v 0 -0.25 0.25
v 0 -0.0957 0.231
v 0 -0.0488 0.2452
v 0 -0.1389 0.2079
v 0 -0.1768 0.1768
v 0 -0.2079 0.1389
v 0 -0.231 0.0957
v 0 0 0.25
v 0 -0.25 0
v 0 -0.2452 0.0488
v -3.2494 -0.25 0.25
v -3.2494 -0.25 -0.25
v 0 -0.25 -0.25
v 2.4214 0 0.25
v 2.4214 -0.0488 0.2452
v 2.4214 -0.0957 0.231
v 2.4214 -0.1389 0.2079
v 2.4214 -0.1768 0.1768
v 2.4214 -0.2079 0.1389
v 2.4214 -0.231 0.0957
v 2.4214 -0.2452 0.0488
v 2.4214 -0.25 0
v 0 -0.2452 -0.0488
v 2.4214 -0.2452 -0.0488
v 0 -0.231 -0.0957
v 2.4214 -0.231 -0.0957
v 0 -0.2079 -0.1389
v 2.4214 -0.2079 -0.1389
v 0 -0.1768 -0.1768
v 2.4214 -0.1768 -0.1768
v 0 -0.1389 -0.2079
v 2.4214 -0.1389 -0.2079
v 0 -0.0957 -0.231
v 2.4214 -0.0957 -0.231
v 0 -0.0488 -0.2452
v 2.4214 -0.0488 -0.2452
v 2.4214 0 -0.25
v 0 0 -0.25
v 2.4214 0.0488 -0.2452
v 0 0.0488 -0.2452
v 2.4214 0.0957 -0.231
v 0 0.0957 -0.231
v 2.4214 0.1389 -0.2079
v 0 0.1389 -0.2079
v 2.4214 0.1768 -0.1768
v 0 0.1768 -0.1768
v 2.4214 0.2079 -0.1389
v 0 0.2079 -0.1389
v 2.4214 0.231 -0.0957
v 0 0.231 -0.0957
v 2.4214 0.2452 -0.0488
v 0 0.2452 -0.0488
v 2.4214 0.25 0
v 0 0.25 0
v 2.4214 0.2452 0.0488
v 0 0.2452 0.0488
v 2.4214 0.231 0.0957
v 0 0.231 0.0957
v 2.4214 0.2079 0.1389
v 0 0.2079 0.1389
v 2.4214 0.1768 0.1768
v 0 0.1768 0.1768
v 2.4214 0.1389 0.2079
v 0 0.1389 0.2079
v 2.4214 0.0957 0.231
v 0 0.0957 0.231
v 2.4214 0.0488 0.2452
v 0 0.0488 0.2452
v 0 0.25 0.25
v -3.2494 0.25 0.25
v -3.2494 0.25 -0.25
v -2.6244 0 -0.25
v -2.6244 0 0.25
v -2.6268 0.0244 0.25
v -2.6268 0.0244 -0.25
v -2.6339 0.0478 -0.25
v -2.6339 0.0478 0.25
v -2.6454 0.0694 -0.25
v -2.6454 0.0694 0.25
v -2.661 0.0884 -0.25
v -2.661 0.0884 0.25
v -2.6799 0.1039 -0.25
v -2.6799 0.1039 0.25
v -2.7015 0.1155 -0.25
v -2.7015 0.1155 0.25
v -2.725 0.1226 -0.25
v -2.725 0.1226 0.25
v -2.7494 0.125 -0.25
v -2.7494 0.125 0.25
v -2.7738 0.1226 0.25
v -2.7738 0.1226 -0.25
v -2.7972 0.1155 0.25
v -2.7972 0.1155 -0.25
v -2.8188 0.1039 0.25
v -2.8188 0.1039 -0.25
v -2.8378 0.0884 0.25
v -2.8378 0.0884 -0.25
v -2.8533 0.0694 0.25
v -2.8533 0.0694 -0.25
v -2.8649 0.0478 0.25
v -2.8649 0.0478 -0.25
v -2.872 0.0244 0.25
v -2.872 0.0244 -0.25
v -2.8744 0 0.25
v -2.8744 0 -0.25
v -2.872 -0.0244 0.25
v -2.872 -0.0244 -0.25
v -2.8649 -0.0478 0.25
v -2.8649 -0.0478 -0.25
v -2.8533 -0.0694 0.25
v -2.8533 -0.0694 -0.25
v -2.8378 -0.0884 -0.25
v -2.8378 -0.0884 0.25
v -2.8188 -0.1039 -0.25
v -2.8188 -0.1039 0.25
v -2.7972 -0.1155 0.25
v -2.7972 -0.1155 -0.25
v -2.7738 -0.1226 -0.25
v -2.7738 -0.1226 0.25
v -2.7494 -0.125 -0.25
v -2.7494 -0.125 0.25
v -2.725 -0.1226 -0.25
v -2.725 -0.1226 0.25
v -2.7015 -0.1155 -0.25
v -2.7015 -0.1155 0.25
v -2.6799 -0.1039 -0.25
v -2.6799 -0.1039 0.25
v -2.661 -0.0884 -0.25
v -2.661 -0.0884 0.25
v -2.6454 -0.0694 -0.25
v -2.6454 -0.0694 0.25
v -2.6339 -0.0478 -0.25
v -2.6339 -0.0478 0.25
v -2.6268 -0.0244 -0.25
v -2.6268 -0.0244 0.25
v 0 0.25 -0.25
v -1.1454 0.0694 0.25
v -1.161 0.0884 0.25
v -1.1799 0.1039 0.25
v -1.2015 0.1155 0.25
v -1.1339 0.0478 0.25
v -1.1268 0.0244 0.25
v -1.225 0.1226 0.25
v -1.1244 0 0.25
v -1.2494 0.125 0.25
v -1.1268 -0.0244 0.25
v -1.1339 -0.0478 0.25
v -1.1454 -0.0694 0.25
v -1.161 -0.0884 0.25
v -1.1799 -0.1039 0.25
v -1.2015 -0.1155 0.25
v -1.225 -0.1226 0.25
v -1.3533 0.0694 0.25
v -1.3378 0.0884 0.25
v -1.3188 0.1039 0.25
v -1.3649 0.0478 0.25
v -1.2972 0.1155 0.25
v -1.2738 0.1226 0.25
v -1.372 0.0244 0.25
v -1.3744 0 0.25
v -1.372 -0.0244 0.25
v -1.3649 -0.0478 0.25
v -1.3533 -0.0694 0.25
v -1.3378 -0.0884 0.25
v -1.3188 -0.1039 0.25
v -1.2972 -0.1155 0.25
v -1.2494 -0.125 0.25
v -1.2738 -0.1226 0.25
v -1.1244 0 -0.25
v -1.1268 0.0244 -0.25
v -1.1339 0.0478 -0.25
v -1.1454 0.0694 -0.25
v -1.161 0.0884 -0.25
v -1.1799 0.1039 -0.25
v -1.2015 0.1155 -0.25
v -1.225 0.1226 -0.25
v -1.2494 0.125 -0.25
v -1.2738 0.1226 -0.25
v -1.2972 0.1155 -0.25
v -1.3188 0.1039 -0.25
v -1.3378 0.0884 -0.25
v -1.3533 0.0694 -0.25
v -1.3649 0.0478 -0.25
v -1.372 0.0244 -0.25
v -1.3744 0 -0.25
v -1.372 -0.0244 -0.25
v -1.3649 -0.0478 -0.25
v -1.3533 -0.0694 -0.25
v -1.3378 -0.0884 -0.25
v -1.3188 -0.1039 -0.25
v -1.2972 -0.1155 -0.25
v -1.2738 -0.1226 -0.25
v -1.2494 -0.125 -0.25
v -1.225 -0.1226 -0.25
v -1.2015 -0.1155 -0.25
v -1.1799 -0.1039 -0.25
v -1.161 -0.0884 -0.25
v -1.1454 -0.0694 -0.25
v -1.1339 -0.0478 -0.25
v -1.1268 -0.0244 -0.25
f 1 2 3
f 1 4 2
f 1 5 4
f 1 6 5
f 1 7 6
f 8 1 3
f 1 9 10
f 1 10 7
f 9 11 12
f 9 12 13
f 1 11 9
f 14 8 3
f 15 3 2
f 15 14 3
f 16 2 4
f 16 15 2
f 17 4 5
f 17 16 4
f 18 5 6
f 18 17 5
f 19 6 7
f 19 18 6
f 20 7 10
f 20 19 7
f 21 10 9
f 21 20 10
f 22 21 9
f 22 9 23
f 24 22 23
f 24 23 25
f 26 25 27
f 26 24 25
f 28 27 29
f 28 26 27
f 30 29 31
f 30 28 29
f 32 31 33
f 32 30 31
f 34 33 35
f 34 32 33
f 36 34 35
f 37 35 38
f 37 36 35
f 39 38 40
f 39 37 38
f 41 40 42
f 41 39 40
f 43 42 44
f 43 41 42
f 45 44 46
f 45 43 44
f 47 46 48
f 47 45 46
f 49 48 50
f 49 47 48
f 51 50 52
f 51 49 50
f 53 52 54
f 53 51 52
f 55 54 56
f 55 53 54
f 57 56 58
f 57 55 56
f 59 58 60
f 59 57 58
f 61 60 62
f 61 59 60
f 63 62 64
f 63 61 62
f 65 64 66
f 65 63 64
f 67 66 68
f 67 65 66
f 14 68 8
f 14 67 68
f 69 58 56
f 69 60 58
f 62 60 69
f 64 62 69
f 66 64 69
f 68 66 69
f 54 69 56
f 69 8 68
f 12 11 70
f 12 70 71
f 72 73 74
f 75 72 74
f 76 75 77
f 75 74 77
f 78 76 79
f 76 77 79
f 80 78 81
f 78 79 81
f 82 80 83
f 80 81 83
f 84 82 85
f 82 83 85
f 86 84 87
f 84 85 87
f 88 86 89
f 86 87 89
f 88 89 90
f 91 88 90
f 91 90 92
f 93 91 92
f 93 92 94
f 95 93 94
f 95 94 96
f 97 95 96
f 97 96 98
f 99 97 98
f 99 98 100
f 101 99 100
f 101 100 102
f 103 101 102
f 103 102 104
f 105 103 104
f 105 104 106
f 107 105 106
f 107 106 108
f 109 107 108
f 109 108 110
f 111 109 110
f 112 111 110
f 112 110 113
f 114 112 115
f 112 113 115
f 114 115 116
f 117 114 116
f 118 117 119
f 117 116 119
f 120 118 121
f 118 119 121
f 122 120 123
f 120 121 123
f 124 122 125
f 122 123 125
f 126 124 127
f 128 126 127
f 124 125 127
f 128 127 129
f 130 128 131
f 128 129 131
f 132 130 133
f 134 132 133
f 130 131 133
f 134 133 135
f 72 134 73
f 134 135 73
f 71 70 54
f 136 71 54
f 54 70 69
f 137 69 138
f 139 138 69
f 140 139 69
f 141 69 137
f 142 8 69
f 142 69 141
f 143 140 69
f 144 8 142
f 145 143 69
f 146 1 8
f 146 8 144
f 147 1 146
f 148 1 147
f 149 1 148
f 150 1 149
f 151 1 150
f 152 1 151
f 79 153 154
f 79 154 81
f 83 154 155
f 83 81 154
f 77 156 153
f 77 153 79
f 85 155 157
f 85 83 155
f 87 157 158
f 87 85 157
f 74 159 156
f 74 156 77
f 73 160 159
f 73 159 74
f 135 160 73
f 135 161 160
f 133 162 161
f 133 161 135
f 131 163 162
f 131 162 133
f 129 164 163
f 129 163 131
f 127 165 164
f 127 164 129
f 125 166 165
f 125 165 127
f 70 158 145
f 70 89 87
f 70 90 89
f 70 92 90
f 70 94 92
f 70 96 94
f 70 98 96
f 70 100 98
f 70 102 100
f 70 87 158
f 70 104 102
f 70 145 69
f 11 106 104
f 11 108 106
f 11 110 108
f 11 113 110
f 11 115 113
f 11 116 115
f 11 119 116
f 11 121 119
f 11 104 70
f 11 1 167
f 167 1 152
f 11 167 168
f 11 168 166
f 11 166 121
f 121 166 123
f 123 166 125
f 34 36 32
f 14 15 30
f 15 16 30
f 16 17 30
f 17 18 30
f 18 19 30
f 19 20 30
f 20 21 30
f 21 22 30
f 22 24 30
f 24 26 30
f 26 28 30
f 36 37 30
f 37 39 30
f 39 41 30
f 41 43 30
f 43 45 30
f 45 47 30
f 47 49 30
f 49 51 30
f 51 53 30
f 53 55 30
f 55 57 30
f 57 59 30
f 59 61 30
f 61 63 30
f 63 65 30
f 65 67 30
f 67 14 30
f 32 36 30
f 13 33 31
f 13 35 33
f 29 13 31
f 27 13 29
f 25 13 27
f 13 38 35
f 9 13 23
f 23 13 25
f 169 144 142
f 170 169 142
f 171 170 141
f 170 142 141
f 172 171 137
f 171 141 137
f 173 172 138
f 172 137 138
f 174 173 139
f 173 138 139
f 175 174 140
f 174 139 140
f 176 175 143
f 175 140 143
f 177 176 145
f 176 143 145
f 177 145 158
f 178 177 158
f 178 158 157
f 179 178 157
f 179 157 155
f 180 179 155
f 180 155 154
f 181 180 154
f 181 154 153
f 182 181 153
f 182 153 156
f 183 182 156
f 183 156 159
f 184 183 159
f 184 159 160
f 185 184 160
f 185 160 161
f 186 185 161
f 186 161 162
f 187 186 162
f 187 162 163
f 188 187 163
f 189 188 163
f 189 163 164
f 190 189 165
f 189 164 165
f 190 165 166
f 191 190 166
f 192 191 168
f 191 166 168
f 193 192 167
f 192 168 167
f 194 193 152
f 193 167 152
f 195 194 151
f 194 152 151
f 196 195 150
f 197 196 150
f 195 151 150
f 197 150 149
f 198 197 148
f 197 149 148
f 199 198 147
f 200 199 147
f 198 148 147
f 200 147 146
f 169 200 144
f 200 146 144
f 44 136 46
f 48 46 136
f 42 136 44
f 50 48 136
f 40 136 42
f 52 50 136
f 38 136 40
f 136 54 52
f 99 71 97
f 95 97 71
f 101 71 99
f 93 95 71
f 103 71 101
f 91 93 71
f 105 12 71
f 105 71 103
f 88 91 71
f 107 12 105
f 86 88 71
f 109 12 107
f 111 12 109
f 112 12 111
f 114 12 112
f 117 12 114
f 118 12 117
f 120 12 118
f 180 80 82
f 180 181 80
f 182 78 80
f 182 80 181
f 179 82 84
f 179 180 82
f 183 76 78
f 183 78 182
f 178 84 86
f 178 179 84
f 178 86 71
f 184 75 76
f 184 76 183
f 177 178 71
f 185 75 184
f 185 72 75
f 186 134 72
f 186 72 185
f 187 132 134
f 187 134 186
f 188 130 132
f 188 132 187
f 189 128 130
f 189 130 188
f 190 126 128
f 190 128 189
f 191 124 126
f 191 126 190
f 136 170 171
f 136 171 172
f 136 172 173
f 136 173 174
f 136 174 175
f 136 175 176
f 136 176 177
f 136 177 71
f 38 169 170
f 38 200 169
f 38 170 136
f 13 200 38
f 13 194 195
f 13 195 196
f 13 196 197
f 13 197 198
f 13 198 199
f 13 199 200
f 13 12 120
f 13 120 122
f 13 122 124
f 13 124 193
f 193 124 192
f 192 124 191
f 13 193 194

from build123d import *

# Parameters (mm, degrees)
F1_DEPTH = 0.25
F0_W     = 2.421442
F0_H     = 0.25
F3_R     = 0.125
F4_DEPTH = 0.501


with BuildPart() as f1:
    # F0 (on Front) → F1 (new body, symmetric)
    with BuildSketch(Plane.XZ):
        Polygon((0, 0), (0, 0.25), (-3.249379, 0.25), (-3.249379, -0.25), (0, -0.25), align=None)
    extrude(amount=F1_DEPTH, both=True)

    # F0 (on Front) → F2 (revolve)
    with BuildSketch(Plane.XZ):
        with Locations((1.210721, 0.125)):
            Rectangle(F0_W, F0_H)
    revolve(axis=Axis((1.210721, 0, 0), (1, 0, 0)))

    # F3 (on face) → F4 (cut, through all)
    with BuildSketch(Plane.XY.offset(0.25)):
        with Locations((-2.749379, 0)):
            Circle(F3_R)
        with Locations((-1.249379, 0)):
            Circle(F3_R)
    extrude(amount=-F4_DEPTH, mode=Mode.SUBTRACT)


solid = f1.part
